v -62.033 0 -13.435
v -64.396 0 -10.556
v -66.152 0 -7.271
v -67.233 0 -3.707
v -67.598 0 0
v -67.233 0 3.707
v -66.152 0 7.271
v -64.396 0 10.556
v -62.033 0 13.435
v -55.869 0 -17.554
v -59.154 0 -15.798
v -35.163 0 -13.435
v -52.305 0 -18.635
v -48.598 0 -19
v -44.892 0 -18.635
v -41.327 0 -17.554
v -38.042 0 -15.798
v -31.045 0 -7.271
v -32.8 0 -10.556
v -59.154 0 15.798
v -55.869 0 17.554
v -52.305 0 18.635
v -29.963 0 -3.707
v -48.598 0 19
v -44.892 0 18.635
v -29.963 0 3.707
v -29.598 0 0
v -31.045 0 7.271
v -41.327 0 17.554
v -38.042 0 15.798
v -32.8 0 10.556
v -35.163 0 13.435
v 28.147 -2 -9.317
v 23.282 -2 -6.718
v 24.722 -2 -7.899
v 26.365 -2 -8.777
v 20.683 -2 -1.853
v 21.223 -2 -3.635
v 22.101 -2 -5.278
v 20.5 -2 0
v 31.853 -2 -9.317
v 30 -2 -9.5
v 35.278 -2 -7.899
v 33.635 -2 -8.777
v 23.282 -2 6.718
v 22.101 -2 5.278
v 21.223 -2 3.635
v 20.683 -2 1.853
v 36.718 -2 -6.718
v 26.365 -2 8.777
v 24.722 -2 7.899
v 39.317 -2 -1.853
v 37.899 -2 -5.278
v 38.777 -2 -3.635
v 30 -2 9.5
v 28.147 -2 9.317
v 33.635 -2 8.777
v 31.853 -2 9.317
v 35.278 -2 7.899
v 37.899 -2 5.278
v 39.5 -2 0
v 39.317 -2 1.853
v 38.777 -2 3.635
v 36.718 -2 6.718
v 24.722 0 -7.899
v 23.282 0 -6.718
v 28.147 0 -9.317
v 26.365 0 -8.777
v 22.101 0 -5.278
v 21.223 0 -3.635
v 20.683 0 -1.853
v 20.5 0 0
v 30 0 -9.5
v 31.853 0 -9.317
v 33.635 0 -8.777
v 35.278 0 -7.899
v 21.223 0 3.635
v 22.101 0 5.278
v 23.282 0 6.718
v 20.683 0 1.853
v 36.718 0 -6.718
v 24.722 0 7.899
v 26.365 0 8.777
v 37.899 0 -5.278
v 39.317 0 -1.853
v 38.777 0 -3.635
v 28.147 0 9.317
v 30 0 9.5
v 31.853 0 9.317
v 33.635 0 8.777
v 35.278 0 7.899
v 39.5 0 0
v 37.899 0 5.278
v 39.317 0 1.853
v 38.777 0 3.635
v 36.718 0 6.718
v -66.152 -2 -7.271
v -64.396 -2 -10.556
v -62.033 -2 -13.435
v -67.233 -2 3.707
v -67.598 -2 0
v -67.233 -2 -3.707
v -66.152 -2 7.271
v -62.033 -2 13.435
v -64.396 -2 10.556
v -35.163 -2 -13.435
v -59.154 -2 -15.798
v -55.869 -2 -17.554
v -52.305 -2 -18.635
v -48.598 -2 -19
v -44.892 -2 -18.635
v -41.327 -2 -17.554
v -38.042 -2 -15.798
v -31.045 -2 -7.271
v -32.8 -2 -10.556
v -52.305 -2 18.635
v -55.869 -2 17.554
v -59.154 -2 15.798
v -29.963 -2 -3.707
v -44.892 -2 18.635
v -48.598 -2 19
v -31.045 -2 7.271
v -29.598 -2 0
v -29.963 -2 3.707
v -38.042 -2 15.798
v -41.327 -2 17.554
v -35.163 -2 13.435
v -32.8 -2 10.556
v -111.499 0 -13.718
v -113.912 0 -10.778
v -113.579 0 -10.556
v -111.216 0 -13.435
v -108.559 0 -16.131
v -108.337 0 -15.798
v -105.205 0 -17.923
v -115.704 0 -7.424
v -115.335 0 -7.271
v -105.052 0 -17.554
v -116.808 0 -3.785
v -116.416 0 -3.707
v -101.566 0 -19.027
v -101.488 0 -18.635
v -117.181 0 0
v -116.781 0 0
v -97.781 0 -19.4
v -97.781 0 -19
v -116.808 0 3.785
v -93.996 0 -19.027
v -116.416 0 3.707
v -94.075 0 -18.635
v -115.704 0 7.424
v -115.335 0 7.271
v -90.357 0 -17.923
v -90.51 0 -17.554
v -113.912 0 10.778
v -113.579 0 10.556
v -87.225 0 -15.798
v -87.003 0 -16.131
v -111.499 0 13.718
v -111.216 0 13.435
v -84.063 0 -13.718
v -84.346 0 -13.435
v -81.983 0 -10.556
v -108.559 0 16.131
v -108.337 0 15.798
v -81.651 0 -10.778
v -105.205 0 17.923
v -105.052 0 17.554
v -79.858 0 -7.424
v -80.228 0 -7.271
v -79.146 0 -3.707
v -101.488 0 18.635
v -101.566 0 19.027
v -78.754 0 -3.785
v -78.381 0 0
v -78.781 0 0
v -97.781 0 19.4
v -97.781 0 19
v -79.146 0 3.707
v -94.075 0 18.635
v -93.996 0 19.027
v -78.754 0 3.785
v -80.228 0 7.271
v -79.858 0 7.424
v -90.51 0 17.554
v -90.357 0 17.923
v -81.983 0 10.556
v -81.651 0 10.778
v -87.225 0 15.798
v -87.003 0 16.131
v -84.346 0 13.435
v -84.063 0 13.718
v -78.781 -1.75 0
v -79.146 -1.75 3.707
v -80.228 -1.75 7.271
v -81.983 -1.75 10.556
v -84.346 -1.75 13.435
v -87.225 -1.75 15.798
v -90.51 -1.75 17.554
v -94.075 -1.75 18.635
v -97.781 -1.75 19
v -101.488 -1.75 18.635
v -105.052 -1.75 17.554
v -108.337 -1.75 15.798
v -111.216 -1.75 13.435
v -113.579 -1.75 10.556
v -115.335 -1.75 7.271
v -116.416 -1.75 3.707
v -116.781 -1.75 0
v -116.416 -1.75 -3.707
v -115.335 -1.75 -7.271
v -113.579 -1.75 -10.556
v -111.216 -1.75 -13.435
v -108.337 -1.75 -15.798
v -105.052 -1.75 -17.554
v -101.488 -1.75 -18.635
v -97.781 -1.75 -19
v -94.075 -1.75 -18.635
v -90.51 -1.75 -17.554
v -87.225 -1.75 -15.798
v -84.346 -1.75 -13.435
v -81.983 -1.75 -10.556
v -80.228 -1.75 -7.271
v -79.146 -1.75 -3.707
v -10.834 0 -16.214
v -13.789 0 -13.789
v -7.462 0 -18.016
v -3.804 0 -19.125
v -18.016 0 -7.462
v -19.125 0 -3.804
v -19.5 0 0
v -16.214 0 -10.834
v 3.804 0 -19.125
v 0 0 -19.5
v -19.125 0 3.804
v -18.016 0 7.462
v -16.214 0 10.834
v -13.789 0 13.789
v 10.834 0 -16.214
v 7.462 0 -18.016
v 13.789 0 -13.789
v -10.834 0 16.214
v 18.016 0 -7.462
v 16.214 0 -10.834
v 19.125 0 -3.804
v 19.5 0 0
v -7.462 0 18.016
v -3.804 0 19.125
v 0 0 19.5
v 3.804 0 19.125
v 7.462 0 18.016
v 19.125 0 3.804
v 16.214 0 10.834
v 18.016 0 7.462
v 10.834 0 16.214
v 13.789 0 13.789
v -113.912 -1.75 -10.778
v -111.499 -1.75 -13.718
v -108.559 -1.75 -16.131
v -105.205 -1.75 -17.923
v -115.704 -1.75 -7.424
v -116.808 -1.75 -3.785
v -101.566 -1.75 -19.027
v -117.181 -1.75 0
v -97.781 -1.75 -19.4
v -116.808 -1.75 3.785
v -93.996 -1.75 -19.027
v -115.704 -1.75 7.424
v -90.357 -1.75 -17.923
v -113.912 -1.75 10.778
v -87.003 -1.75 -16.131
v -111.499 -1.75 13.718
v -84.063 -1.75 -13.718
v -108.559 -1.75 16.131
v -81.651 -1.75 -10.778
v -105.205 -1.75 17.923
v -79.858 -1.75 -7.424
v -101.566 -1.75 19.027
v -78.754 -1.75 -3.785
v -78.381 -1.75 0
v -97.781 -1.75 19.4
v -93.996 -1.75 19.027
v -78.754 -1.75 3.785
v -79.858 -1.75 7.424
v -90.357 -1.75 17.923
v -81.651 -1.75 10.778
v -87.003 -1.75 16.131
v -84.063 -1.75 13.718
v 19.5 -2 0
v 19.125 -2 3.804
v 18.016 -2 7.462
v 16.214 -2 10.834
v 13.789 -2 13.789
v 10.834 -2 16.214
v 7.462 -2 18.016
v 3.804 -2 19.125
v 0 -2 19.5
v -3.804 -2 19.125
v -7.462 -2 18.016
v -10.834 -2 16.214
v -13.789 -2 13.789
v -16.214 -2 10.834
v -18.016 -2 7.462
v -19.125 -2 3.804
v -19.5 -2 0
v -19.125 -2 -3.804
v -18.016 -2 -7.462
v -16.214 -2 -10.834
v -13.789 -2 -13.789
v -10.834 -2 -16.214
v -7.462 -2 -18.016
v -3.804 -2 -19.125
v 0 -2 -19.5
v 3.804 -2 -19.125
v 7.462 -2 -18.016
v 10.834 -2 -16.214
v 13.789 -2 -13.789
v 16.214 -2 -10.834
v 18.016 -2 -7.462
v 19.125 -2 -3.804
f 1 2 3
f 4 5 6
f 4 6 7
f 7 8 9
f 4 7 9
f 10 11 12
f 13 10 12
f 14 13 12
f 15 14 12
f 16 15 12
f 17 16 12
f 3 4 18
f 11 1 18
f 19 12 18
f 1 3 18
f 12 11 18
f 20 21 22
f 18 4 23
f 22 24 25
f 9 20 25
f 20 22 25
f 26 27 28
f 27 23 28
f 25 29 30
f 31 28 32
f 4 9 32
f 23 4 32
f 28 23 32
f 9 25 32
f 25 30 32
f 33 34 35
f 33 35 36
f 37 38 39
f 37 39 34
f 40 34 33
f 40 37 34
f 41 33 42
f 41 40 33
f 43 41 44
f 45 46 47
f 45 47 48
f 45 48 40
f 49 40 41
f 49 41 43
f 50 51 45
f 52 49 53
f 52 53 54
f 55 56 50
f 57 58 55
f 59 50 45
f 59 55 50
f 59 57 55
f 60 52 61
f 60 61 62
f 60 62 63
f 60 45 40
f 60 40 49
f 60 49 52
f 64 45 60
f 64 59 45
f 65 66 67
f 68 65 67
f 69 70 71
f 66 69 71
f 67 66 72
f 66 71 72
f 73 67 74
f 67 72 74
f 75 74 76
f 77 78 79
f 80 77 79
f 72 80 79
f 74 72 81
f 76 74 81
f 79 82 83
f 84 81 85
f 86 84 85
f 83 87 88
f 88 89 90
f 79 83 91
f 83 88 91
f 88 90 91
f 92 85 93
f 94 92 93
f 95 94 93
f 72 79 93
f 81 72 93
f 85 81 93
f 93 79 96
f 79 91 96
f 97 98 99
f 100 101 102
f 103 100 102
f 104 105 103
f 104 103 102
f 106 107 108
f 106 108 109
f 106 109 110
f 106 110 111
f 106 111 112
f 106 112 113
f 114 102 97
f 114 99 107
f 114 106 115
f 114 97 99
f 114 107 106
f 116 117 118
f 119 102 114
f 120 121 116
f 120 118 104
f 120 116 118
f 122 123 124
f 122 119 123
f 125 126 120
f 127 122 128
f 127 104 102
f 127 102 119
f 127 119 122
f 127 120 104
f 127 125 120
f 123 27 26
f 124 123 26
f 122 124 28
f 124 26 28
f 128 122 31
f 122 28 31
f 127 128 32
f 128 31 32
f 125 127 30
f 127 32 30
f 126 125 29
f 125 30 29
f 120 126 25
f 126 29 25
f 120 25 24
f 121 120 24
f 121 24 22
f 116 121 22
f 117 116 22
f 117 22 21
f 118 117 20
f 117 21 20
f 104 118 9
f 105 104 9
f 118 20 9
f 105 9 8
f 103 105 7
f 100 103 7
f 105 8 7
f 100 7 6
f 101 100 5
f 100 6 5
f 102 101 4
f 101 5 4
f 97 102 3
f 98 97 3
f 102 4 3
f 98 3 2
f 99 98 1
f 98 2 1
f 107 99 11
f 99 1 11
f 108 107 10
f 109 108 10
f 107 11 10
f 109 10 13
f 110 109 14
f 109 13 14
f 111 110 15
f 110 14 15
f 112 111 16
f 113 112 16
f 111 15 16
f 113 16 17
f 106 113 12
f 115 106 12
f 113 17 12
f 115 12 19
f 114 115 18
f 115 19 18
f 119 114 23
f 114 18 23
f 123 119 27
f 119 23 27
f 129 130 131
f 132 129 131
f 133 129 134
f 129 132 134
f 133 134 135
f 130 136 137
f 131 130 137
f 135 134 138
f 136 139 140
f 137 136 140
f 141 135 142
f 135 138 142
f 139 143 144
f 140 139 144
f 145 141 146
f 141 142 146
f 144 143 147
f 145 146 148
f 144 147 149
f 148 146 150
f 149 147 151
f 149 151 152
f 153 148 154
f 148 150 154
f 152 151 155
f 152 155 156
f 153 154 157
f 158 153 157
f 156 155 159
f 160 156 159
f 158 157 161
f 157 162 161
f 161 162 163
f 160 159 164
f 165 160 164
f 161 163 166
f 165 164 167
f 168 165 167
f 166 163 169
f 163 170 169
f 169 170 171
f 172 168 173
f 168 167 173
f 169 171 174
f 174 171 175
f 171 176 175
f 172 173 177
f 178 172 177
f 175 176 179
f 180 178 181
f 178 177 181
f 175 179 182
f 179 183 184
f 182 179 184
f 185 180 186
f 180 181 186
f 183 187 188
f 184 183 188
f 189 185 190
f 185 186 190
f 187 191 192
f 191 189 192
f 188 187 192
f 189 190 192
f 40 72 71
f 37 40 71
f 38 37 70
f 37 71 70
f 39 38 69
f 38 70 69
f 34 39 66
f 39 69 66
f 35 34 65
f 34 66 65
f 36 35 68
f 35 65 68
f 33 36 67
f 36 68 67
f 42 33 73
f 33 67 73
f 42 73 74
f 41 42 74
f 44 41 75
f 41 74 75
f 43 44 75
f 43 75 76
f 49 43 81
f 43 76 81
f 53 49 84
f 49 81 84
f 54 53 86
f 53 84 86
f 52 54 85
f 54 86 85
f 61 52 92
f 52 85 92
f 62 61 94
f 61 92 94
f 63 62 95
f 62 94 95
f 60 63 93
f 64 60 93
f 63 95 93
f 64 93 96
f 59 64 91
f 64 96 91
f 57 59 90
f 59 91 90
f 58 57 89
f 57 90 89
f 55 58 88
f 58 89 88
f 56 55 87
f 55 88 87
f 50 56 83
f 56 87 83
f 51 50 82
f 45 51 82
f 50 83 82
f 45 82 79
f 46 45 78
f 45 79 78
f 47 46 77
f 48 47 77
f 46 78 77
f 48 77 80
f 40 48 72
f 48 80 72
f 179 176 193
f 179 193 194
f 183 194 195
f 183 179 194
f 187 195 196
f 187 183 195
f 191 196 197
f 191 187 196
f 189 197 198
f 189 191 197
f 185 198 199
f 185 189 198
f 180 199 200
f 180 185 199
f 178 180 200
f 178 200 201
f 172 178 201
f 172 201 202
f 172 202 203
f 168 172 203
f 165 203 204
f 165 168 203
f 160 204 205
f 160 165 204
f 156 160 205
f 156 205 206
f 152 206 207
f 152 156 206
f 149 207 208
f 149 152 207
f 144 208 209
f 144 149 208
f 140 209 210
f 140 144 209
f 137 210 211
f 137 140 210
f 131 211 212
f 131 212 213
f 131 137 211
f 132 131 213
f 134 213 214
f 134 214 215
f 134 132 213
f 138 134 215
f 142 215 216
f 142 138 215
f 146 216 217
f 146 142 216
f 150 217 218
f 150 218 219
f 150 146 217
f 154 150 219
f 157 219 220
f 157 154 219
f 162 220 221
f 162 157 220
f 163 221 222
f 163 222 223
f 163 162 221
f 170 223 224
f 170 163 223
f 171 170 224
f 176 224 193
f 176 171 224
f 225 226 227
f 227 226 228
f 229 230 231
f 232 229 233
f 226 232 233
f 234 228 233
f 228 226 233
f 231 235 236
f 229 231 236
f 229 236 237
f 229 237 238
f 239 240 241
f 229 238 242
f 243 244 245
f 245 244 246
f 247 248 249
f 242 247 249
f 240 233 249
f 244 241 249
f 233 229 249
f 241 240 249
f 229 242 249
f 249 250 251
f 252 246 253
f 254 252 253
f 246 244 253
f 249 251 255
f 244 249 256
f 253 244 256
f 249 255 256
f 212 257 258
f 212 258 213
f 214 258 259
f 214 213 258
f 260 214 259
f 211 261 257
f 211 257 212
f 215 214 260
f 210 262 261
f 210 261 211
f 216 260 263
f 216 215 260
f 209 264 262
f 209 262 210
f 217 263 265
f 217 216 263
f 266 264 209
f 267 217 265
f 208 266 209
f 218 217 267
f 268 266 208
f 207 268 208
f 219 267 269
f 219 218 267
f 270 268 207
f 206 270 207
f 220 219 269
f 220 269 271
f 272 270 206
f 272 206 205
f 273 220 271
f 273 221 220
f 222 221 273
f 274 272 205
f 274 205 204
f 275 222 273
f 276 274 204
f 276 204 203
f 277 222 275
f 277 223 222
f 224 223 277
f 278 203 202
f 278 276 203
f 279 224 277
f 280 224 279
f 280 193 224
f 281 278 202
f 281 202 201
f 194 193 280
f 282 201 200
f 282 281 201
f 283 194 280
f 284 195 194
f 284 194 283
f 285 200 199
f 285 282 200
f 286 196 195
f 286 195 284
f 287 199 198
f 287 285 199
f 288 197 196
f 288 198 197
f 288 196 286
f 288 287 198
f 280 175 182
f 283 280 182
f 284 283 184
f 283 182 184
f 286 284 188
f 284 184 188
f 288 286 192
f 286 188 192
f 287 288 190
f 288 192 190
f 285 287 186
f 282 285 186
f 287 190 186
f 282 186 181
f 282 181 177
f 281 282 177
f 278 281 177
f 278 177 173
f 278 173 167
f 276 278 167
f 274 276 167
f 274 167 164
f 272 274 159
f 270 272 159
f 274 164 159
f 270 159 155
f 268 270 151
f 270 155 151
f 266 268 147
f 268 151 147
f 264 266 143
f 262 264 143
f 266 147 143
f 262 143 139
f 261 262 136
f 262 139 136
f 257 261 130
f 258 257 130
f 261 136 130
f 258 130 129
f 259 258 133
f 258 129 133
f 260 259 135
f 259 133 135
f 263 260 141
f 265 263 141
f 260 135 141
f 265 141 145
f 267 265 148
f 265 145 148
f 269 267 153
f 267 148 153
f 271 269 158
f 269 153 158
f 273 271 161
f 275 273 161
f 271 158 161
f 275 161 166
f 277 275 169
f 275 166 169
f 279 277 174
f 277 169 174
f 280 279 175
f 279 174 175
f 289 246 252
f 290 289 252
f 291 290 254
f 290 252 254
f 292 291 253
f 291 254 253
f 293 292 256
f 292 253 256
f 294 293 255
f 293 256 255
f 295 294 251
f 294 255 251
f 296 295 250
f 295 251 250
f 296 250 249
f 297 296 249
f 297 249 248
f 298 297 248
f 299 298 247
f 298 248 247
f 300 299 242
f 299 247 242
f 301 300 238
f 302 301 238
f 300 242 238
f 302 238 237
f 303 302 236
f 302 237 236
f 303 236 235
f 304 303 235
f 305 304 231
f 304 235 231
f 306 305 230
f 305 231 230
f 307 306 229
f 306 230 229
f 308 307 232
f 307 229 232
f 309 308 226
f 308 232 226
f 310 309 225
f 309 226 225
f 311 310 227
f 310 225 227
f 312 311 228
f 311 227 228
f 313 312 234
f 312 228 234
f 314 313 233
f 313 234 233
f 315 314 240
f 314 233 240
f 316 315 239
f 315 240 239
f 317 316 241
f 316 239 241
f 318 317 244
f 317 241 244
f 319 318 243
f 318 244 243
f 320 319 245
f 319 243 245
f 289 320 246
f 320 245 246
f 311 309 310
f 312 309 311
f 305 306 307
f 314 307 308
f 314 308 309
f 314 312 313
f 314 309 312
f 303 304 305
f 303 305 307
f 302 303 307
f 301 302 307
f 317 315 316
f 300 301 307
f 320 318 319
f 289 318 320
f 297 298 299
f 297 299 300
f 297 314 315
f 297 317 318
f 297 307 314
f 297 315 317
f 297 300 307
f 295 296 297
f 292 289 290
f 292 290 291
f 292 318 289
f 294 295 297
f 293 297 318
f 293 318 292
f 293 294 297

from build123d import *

# Parameters (mm, degrees)
F0_R     = 19.5
F0_R_2   = 19
F1_DEPTH = 2
F0_R_3   = 19.4
F2_DEPTH = 1.75


with BuildPart() as f1:
    # F0 (on Front) → F1 (new body)
    with BuildSketch(Plane.XZ):
        Circle(F0_R)
        with BuildLine():
            ThreePointArc((39.5, 0), (30, 9.5), (20.5, 0))
            ThreePointArc((20.5, 0), (30, -9.5), (39.5, 0))
        make_face()
        with Locations((-48.598319, 0)):
            Circle(F0_R_2)
    extrude(amount=F1_DEPTH)


with BuildPart() as f2:
    # F0 (on Front) → F2 (new body)
    with BuildSketch(Plane.XZ):
        with Locations((-97.781233, 0)):
            Circle(F0_R_3)
        with Locations((-97.781233, 0)):
            Circle(F0_R_2, mode=Mode.SUBTRACT)
    extrude(amount=F2_DEPTH)


solid = Compound([f1.part, f2.part])
